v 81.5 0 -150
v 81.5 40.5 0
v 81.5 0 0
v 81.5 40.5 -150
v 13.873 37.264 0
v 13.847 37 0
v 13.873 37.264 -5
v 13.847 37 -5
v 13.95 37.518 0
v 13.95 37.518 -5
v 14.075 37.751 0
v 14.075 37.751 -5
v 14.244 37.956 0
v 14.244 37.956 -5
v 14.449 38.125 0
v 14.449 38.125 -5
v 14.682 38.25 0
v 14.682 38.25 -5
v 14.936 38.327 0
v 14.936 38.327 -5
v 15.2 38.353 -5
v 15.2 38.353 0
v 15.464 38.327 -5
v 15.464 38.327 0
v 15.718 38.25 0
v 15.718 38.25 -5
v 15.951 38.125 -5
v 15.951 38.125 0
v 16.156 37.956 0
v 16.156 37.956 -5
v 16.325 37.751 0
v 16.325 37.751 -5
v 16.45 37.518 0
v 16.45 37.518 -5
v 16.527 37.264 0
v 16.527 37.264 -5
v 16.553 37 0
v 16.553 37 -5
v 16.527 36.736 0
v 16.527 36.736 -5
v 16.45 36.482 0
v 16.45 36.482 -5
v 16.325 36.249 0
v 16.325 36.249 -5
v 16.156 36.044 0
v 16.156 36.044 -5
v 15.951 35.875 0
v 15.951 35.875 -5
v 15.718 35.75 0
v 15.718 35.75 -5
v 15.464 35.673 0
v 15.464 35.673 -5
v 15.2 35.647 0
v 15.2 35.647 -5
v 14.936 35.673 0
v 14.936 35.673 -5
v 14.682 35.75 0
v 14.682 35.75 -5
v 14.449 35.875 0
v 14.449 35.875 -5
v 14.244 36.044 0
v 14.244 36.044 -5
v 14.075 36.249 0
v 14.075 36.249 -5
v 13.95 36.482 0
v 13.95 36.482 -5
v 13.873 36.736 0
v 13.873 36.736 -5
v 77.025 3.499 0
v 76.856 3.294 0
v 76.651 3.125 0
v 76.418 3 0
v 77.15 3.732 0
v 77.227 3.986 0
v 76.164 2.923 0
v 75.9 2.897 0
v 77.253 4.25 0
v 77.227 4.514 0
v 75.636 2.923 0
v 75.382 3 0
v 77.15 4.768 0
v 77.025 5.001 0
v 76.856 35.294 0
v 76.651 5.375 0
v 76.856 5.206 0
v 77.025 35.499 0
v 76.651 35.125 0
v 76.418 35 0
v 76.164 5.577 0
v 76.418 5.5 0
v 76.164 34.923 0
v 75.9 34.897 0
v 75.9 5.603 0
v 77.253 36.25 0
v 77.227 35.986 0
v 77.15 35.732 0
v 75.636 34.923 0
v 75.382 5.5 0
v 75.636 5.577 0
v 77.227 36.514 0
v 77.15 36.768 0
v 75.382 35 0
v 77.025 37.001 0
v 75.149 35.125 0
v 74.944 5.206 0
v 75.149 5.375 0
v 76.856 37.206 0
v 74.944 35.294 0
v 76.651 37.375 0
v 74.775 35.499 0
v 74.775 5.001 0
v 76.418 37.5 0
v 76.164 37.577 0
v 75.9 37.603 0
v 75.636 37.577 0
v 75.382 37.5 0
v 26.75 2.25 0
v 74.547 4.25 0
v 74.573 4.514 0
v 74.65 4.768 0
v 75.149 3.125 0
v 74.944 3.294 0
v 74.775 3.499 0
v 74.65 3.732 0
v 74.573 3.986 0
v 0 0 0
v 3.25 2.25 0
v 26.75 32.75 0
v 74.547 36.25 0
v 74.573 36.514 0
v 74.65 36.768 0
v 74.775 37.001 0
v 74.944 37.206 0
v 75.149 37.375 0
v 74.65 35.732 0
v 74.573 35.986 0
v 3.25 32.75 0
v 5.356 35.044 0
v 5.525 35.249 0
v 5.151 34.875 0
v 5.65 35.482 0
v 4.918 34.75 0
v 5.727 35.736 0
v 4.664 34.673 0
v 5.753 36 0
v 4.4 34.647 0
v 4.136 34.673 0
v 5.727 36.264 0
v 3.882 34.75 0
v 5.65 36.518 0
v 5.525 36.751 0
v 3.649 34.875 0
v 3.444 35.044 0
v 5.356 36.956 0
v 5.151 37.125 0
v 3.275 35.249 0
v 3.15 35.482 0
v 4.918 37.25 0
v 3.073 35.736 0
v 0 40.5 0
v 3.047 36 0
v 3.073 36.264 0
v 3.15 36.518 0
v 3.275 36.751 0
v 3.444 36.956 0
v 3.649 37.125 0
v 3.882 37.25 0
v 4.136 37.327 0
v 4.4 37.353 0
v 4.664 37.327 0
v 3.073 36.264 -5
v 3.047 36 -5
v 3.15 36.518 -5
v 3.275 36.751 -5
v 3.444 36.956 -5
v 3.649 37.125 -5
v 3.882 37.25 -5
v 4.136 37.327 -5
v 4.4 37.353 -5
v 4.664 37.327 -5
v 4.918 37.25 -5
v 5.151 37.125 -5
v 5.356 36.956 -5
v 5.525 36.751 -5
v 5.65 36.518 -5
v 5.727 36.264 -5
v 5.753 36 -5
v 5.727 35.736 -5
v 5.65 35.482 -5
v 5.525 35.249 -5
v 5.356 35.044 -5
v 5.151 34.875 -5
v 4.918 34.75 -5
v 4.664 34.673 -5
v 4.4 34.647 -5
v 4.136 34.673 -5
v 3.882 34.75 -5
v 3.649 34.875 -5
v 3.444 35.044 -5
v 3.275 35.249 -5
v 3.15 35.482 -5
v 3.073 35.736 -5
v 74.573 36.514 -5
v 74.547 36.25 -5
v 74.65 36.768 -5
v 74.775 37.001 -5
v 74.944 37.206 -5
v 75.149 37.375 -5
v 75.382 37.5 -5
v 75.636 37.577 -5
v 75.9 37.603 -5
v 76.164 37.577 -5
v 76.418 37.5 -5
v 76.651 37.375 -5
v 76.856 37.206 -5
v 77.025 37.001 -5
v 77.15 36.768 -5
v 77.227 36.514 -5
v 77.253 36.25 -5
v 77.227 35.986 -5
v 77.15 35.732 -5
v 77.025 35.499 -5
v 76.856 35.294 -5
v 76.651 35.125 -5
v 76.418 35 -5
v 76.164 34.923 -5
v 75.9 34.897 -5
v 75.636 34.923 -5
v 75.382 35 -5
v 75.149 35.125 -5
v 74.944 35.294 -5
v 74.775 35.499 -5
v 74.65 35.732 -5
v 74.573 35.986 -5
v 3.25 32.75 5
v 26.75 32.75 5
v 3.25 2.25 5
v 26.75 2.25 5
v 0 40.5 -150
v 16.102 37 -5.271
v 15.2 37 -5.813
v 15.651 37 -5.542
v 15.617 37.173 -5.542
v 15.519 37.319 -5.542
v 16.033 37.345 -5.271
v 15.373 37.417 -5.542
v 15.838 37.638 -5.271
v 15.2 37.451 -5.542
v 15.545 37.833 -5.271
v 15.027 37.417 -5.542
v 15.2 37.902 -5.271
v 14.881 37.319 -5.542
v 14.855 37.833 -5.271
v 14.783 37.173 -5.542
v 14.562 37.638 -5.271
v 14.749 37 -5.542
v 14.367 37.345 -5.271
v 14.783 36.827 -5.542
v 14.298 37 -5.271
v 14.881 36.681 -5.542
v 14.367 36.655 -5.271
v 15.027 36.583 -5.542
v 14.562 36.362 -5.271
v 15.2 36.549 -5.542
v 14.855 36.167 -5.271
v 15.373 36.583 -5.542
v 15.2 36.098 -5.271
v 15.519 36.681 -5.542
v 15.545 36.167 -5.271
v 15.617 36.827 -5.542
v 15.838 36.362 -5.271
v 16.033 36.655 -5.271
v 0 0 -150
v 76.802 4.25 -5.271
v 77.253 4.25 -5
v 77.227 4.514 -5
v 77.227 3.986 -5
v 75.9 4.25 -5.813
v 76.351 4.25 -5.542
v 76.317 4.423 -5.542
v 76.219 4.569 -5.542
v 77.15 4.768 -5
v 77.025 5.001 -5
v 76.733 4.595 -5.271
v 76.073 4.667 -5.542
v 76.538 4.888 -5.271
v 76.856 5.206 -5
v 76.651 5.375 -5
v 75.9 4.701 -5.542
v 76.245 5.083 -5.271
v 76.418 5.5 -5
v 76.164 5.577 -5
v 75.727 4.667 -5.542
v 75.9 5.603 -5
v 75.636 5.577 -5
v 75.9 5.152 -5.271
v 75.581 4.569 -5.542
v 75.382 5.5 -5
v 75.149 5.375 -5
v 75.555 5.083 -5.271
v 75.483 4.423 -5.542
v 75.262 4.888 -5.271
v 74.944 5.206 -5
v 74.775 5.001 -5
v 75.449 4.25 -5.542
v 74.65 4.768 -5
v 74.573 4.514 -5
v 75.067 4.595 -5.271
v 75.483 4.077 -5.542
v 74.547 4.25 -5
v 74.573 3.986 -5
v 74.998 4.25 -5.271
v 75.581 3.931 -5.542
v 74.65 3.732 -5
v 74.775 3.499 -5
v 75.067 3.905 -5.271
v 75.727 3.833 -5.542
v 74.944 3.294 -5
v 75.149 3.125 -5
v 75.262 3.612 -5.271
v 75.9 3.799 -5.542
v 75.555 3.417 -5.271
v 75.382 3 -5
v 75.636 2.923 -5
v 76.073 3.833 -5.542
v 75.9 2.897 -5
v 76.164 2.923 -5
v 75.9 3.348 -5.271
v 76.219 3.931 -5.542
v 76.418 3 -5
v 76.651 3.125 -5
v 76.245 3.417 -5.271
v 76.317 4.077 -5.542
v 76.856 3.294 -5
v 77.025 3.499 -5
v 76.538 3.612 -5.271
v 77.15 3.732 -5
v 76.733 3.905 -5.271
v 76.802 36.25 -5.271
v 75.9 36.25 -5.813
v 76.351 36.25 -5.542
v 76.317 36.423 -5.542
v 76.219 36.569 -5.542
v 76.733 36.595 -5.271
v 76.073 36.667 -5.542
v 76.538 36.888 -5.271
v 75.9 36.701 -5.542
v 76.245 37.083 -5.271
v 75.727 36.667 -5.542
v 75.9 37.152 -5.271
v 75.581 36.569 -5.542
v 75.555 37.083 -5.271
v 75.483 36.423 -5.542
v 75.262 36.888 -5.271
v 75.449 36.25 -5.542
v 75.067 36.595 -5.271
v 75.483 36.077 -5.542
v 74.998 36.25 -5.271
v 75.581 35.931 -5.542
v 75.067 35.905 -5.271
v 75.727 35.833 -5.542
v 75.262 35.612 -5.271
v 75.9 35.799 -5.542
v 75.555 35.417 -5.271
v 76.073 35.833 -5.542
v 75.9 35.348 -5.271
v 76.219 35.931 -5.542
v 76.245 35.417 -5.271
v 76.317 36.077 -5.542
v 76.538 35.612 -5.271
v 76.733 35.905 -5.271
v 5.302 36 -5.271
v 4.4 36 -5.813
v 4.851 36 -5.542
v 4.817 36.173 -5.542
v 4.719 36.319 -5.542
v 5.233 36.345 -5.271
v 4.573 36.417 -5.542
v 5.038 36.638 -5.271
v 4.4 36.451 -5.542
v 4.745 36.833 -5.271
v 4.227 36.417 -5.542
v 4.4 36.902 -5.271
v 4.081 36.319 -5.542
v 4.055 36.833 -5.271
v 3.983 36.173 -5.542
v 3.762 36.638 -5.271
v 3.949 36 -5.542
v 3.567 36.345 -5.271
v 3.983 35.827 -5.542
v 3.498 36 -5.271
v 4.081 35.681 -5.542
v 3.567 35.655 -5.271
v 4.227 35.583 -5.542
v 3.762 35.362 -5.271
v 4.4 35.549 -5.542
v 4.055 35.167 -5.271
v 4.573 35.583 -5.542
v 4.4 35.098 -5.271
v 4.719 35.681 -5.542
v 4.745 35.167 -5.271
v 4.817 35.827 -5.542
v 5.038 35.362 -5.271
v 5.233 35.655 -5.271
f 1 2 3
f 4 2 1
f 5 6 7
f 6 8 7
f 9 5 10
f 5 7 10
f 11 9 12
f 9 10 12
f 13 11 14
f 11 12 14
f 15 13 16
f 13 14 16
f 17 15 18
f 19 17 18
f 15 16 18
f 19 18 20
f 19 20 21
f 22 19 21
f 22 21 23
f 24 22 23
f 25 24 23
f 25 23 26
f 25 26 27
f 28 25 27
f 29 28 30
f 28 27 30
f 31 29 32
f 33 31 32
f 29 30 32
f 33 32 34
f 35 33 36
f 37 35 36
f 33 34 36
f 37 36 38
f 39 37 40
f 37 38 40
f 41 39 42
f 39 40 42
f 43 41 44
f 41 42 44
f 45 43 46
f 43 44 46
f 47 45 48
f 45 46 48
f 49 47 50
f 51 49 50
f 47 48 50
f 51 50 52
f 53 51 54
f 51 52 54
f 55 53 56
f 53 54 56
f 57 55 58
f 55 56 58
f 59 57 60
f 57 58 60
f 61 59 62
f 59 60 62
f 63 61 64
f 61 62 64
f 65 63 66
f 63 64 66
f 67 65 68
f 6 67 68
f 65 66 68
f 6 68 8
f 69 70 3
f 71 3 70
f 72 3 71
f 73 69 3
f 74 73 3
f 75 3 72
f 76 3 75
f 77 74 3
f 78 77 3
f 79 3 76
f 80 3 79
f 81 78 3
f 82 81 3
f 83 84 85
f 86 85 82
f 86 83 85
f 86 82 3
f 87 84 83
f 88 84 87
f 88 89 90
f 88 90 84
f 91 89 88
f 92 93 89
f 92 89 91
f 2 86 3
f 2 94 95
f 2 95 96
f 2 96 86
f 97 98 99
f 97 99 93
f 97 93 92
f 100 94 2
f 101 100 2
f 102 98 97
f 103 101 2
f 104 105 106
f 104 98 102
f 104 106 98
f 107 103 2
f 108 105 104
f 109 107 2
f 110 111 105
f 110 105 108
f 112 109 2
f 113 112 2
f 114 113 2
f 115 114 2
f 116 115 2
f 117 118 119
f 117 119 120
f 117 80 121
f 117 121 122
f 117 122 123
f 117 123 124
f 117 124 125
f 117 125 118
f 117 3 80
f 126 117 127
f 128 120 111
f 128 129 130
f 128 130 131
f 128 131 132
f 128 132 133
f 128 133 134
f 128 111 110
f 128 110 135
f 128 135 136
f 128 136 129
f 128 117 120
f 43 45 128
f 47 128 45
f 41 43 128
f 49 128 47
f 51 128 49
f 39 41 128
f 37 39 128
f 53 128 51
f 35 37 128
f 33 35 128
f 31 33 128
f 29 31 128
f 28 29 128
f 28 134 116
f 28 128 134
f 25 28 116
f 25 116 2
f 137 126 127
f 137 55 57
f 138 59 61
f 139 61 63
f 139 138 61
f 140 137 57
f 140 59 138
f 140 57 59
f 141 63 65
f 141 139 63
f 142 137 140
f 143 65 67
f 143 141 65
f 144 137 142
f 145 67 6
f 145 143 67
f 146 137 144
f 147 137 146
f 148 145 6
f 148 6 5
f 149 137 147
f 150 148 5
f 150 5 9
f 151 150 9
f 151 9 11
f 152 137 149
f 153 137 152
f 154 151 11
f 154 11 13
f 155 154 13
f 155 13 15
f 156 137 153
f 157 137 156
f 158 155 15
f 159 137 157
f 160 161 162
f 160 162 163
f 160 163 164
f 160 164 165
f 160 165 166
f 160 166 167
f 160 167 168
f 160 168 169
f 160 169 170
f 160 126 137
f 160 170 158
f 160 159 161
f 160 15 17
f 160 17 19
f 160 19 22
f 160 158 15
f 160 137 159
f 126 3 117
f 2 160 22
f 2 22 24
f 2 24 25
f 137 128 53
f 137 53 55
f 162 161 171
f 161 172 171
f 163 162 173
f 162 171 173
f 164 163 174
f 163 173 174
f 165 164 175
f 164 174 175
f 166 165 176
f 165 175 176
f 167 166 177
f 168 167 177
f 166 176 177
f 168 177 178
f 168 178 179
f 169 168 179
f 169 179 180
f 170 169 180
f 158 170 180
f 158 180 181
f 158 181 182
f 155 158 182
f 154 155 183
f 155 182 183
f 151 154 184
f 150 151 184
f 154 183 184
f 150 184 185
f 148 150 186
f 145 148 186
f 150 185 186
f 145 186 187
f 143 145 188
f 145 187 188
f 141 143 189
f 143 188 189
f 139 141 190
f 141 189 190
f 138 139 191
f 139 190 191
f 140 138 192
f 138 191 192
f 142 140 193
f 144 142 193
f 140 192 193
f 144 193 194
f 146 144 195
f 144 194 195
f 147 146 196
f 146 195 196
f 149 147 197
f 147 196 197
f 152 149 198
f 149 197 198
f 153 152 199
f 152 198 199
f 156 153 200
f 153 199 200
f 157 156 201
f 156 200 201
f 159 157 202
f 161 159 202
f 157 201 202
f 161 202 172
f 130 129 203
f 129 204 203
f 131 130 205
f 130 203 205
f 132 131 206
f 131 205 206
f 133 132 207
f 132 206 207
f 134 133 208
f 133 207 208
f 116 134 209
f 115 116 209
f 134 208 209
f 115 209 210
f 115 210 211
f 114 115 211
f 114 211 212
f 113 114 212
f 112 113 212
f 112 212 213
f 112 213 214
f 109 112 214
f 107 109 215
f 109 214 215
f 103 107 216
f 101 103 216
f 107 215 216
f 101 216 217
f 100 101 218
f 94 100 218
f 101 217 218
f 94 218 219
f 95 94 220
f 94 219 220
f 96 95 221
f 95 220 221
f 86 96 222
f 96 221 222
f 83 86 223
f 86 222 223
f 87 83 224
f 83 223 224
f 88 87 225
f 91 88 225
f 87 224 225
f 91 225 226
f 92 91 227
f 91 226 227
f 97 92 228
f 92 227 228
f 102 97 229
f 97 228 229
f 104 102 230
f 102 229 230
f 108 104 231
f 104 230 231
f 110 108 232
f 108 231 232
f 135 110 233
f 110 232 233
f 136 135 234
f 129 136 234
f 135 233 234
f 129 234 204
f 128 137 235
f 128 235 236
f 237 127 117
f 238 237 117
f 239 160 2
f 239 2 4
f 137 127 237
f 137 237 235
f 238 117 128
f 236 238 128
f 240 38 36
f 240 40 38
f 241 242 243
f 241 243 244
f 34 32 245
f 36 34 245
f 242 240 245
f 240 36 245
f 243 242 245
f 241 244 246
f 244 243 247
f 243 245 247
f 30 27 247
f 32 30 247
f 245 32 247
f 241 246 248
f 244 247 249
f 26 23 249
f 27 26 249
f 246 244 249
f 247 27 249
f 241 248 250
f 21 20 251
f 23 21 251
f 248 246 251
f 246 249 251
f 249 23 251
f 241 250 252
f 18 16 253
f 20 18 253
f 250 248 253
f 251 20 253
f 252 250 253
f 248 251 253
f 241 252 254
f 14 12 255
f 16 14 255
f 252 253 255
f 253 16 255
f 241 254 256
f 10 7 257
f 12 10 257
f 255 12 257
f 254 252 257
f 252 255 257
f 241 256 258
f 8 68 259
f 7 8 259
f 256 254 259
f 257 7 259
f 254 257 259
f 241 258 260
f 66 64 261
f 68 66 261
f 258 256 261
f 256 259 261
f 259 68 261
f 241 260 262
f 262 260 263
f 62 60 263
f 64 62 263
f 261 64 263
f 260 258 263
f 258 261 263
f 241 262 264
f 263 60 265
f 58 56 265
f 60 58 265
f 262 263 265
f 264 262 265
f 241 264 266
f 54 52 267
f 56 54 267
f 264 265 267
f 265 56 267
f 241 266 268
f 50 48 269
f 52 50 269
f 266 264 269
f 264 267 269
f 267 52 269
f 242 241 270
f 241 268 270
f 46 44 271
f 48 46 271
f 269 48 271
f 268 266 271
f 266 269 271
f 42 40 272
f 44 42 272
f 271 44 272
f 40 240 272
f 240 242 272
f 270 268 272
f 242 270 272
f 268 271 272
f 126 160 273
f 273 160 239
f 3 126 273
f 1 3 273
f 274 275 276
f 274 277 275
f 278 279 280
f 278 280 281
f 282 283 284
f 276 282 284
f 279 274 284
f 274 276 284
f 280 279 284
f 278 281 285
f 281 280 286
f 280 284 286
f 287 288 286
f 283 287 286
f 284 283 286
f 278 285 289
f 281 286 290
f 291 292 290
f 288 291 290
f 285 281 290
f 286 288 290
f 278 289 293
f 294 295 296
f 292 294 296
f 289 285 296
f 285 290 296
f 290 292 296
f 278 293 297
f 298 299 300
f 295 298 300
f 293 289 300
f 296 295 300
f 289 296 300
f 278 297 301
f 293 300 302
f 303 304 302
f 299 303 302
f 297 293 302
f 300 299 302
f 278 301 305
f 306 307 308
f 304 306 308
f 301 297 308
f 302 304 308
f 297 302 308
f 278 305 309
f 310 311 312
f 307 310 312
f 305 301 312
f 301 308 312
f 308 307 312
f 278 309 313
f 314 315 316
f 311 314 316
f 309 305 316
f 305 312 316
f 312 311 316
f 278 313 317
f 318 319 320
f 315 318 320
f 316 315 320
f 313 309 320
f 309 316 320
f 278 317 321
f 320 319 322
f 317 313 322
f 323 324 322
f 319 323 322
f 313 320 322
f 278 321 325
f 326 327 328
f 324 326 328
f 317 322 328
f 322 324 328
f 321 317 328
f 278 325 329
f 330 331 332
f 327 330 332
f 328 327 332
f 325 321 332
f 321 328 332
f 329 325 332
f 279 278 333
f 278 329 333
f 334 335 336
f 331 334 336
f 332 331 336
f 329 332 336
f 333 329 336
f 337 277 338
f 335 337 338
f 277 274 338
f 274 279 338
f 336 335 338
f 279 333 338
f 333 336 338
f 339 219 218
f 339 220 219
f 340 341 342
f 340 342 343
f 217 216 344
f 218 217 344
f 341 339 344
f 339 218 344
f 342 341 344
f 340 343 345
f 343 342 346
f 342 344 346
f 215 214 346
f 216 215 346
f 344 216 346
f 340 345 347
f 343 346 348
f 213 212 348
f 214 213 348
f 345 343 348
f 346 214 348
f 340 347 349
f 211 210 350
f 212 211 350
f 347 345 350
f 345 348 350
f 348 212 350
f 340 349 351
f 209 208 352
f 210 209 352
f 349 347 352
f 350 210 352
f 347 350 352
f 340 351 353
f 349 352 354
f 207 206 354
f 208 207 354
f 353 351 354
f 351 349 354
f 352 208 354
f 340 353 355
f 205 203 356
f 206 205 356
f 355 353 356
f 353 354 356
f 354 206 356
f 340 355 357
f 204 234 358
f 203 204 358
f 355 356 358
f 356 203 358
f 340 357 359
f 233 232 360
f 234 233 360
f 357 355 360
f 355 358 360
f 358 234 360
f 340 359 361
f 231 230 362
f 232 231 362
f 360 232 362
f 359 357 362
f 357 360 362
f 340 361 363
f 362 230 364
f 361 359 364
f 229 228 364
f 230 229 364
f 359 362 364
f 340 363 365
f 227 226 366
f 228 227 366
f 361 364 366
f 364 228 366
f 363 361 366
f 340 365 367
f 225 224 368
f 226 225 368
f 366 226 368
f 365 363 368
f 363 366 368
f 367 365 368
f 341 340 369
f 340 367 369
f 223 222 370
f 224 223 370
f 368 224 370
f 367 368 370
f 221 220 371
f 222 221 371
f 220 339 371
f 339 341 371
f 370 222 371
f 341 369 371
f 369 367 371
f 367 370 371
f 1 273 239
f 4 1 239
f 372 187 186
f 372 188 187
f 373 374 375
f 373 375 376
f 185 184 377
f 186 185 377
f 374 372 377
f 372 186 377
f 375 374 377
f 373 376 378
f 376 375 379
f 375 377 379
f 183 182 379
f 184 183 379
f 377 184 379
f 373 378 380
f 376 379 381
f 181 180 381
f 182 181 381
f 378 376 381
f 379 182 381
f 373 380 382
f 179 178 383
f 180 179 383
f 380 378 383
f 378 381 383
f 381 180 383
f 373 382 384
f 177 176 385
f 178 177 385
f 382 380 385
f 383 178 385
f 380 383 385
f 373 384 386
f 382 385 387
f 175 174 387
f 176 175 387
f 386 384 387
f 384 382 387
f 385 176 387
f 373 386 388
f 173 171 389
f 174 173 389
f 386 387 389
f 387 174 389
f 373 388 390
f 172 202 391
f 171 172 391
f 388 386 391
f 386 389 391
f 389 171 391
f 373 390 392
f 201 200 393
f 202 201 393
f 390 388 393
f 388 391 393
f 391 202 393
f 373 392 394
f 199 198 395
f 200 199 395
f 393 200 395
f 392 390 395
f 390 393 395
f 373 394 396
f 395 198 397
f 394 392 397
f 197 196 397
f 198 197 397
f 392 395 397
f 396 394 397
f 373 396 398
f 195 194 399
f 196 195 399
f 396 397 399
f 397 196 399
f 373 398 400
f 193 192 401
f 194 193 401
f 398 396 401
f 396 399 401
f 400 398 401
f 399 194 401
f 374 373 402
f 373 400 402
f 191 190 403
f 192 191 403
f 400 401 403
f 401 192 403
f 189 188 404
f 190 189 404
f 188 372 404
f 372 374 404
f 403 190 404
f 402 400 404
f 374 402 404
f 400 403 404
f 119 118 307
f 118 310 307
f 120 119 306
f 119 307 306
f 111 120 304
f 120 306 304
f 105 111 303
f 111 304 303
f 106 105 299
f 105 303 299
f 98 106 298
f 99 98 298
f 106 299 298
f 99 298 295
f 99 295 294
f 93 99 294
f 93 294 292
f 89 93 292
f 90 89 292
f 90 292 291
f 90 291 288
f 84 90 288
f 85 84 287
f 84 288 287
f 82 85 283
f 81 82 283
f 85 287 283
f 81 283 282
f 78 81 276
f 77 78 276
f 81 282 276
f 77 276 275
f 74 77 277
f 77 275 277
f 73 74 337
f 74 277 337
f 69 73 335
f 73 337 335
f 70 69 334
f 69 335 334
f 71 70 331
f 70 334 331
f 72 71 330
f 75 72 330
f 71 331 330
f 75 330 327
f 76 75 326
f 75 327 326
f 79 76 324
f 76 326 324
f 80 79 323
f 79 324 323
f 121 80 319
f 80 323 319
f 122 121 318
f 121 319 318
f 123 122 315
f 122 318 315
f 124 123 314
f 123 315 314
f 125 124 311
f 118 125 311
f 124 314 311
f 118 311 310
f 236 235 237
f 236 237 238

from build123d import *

# Parameters (mm, degrees)
SKETCH1_W                 = 150
SKETCH1_H                 = 40.5
MAIN_BODY_DEPTH           = 81.5
F_6_32_TAPPED_HOLE2_D     = 2.7051
F_6_32_TAPPED_HOLE2_DEPTH = 5
F_6_32_TAPPED_HOLE2_TIP   = 0.81269403
SKETCH7_W                 = 23.5
SKETCH7_H                 = 30.5
BOSS_EXTRUDE1_DEPTH       = 5


with BuildPart() as part:
    # Sketch1 → main-body (new body)
    with BuildSketch(Plane(origin=(0, 0, 0), x_dir=(0, 0, -1), z_dir=(1, 0, 0))):
        with Locations((75, 20.25)):
            Rectangle(SKETCH1_W, SKETCH1_H)
    extrude(amount=MAIN_BODY_DEPTH)

    # #6-32 Tapped Hole2
    with Locations(Plane.XY):
        with Locations((4.4, 36), (15.2, 37), (75.9, 36.25), (75.9, 4.25)):
            Hole(F_6_32_TAPPED_HOLE2_D / 2, depth=F_6_32_TAPPED_HOLE2_DEPTH)
            with Locations((0, 0, -(F_6_32_TAPPED_HOLE2_DEPTH + F_6_32_TAPPED_HOLE2_TIP / 2))):  # 118° drill point
                Cone(0, F_6_32_TAPPED_HOLE2_D / 2, F_6_32_TAPPED_HOLE2_TIP, mode=Mode.SUBTRACT)

    # Sketch7 → Boss-Extrude1 (add)
    with BuildSketch(Plane.XY):
        with Locations((15, 17.5)):
            Rectangle(SKETCH7_W, SKETCH7_H)
    extrude(amount=BOSS_EXTRUDE1_DEPTH)


solid = part.part
